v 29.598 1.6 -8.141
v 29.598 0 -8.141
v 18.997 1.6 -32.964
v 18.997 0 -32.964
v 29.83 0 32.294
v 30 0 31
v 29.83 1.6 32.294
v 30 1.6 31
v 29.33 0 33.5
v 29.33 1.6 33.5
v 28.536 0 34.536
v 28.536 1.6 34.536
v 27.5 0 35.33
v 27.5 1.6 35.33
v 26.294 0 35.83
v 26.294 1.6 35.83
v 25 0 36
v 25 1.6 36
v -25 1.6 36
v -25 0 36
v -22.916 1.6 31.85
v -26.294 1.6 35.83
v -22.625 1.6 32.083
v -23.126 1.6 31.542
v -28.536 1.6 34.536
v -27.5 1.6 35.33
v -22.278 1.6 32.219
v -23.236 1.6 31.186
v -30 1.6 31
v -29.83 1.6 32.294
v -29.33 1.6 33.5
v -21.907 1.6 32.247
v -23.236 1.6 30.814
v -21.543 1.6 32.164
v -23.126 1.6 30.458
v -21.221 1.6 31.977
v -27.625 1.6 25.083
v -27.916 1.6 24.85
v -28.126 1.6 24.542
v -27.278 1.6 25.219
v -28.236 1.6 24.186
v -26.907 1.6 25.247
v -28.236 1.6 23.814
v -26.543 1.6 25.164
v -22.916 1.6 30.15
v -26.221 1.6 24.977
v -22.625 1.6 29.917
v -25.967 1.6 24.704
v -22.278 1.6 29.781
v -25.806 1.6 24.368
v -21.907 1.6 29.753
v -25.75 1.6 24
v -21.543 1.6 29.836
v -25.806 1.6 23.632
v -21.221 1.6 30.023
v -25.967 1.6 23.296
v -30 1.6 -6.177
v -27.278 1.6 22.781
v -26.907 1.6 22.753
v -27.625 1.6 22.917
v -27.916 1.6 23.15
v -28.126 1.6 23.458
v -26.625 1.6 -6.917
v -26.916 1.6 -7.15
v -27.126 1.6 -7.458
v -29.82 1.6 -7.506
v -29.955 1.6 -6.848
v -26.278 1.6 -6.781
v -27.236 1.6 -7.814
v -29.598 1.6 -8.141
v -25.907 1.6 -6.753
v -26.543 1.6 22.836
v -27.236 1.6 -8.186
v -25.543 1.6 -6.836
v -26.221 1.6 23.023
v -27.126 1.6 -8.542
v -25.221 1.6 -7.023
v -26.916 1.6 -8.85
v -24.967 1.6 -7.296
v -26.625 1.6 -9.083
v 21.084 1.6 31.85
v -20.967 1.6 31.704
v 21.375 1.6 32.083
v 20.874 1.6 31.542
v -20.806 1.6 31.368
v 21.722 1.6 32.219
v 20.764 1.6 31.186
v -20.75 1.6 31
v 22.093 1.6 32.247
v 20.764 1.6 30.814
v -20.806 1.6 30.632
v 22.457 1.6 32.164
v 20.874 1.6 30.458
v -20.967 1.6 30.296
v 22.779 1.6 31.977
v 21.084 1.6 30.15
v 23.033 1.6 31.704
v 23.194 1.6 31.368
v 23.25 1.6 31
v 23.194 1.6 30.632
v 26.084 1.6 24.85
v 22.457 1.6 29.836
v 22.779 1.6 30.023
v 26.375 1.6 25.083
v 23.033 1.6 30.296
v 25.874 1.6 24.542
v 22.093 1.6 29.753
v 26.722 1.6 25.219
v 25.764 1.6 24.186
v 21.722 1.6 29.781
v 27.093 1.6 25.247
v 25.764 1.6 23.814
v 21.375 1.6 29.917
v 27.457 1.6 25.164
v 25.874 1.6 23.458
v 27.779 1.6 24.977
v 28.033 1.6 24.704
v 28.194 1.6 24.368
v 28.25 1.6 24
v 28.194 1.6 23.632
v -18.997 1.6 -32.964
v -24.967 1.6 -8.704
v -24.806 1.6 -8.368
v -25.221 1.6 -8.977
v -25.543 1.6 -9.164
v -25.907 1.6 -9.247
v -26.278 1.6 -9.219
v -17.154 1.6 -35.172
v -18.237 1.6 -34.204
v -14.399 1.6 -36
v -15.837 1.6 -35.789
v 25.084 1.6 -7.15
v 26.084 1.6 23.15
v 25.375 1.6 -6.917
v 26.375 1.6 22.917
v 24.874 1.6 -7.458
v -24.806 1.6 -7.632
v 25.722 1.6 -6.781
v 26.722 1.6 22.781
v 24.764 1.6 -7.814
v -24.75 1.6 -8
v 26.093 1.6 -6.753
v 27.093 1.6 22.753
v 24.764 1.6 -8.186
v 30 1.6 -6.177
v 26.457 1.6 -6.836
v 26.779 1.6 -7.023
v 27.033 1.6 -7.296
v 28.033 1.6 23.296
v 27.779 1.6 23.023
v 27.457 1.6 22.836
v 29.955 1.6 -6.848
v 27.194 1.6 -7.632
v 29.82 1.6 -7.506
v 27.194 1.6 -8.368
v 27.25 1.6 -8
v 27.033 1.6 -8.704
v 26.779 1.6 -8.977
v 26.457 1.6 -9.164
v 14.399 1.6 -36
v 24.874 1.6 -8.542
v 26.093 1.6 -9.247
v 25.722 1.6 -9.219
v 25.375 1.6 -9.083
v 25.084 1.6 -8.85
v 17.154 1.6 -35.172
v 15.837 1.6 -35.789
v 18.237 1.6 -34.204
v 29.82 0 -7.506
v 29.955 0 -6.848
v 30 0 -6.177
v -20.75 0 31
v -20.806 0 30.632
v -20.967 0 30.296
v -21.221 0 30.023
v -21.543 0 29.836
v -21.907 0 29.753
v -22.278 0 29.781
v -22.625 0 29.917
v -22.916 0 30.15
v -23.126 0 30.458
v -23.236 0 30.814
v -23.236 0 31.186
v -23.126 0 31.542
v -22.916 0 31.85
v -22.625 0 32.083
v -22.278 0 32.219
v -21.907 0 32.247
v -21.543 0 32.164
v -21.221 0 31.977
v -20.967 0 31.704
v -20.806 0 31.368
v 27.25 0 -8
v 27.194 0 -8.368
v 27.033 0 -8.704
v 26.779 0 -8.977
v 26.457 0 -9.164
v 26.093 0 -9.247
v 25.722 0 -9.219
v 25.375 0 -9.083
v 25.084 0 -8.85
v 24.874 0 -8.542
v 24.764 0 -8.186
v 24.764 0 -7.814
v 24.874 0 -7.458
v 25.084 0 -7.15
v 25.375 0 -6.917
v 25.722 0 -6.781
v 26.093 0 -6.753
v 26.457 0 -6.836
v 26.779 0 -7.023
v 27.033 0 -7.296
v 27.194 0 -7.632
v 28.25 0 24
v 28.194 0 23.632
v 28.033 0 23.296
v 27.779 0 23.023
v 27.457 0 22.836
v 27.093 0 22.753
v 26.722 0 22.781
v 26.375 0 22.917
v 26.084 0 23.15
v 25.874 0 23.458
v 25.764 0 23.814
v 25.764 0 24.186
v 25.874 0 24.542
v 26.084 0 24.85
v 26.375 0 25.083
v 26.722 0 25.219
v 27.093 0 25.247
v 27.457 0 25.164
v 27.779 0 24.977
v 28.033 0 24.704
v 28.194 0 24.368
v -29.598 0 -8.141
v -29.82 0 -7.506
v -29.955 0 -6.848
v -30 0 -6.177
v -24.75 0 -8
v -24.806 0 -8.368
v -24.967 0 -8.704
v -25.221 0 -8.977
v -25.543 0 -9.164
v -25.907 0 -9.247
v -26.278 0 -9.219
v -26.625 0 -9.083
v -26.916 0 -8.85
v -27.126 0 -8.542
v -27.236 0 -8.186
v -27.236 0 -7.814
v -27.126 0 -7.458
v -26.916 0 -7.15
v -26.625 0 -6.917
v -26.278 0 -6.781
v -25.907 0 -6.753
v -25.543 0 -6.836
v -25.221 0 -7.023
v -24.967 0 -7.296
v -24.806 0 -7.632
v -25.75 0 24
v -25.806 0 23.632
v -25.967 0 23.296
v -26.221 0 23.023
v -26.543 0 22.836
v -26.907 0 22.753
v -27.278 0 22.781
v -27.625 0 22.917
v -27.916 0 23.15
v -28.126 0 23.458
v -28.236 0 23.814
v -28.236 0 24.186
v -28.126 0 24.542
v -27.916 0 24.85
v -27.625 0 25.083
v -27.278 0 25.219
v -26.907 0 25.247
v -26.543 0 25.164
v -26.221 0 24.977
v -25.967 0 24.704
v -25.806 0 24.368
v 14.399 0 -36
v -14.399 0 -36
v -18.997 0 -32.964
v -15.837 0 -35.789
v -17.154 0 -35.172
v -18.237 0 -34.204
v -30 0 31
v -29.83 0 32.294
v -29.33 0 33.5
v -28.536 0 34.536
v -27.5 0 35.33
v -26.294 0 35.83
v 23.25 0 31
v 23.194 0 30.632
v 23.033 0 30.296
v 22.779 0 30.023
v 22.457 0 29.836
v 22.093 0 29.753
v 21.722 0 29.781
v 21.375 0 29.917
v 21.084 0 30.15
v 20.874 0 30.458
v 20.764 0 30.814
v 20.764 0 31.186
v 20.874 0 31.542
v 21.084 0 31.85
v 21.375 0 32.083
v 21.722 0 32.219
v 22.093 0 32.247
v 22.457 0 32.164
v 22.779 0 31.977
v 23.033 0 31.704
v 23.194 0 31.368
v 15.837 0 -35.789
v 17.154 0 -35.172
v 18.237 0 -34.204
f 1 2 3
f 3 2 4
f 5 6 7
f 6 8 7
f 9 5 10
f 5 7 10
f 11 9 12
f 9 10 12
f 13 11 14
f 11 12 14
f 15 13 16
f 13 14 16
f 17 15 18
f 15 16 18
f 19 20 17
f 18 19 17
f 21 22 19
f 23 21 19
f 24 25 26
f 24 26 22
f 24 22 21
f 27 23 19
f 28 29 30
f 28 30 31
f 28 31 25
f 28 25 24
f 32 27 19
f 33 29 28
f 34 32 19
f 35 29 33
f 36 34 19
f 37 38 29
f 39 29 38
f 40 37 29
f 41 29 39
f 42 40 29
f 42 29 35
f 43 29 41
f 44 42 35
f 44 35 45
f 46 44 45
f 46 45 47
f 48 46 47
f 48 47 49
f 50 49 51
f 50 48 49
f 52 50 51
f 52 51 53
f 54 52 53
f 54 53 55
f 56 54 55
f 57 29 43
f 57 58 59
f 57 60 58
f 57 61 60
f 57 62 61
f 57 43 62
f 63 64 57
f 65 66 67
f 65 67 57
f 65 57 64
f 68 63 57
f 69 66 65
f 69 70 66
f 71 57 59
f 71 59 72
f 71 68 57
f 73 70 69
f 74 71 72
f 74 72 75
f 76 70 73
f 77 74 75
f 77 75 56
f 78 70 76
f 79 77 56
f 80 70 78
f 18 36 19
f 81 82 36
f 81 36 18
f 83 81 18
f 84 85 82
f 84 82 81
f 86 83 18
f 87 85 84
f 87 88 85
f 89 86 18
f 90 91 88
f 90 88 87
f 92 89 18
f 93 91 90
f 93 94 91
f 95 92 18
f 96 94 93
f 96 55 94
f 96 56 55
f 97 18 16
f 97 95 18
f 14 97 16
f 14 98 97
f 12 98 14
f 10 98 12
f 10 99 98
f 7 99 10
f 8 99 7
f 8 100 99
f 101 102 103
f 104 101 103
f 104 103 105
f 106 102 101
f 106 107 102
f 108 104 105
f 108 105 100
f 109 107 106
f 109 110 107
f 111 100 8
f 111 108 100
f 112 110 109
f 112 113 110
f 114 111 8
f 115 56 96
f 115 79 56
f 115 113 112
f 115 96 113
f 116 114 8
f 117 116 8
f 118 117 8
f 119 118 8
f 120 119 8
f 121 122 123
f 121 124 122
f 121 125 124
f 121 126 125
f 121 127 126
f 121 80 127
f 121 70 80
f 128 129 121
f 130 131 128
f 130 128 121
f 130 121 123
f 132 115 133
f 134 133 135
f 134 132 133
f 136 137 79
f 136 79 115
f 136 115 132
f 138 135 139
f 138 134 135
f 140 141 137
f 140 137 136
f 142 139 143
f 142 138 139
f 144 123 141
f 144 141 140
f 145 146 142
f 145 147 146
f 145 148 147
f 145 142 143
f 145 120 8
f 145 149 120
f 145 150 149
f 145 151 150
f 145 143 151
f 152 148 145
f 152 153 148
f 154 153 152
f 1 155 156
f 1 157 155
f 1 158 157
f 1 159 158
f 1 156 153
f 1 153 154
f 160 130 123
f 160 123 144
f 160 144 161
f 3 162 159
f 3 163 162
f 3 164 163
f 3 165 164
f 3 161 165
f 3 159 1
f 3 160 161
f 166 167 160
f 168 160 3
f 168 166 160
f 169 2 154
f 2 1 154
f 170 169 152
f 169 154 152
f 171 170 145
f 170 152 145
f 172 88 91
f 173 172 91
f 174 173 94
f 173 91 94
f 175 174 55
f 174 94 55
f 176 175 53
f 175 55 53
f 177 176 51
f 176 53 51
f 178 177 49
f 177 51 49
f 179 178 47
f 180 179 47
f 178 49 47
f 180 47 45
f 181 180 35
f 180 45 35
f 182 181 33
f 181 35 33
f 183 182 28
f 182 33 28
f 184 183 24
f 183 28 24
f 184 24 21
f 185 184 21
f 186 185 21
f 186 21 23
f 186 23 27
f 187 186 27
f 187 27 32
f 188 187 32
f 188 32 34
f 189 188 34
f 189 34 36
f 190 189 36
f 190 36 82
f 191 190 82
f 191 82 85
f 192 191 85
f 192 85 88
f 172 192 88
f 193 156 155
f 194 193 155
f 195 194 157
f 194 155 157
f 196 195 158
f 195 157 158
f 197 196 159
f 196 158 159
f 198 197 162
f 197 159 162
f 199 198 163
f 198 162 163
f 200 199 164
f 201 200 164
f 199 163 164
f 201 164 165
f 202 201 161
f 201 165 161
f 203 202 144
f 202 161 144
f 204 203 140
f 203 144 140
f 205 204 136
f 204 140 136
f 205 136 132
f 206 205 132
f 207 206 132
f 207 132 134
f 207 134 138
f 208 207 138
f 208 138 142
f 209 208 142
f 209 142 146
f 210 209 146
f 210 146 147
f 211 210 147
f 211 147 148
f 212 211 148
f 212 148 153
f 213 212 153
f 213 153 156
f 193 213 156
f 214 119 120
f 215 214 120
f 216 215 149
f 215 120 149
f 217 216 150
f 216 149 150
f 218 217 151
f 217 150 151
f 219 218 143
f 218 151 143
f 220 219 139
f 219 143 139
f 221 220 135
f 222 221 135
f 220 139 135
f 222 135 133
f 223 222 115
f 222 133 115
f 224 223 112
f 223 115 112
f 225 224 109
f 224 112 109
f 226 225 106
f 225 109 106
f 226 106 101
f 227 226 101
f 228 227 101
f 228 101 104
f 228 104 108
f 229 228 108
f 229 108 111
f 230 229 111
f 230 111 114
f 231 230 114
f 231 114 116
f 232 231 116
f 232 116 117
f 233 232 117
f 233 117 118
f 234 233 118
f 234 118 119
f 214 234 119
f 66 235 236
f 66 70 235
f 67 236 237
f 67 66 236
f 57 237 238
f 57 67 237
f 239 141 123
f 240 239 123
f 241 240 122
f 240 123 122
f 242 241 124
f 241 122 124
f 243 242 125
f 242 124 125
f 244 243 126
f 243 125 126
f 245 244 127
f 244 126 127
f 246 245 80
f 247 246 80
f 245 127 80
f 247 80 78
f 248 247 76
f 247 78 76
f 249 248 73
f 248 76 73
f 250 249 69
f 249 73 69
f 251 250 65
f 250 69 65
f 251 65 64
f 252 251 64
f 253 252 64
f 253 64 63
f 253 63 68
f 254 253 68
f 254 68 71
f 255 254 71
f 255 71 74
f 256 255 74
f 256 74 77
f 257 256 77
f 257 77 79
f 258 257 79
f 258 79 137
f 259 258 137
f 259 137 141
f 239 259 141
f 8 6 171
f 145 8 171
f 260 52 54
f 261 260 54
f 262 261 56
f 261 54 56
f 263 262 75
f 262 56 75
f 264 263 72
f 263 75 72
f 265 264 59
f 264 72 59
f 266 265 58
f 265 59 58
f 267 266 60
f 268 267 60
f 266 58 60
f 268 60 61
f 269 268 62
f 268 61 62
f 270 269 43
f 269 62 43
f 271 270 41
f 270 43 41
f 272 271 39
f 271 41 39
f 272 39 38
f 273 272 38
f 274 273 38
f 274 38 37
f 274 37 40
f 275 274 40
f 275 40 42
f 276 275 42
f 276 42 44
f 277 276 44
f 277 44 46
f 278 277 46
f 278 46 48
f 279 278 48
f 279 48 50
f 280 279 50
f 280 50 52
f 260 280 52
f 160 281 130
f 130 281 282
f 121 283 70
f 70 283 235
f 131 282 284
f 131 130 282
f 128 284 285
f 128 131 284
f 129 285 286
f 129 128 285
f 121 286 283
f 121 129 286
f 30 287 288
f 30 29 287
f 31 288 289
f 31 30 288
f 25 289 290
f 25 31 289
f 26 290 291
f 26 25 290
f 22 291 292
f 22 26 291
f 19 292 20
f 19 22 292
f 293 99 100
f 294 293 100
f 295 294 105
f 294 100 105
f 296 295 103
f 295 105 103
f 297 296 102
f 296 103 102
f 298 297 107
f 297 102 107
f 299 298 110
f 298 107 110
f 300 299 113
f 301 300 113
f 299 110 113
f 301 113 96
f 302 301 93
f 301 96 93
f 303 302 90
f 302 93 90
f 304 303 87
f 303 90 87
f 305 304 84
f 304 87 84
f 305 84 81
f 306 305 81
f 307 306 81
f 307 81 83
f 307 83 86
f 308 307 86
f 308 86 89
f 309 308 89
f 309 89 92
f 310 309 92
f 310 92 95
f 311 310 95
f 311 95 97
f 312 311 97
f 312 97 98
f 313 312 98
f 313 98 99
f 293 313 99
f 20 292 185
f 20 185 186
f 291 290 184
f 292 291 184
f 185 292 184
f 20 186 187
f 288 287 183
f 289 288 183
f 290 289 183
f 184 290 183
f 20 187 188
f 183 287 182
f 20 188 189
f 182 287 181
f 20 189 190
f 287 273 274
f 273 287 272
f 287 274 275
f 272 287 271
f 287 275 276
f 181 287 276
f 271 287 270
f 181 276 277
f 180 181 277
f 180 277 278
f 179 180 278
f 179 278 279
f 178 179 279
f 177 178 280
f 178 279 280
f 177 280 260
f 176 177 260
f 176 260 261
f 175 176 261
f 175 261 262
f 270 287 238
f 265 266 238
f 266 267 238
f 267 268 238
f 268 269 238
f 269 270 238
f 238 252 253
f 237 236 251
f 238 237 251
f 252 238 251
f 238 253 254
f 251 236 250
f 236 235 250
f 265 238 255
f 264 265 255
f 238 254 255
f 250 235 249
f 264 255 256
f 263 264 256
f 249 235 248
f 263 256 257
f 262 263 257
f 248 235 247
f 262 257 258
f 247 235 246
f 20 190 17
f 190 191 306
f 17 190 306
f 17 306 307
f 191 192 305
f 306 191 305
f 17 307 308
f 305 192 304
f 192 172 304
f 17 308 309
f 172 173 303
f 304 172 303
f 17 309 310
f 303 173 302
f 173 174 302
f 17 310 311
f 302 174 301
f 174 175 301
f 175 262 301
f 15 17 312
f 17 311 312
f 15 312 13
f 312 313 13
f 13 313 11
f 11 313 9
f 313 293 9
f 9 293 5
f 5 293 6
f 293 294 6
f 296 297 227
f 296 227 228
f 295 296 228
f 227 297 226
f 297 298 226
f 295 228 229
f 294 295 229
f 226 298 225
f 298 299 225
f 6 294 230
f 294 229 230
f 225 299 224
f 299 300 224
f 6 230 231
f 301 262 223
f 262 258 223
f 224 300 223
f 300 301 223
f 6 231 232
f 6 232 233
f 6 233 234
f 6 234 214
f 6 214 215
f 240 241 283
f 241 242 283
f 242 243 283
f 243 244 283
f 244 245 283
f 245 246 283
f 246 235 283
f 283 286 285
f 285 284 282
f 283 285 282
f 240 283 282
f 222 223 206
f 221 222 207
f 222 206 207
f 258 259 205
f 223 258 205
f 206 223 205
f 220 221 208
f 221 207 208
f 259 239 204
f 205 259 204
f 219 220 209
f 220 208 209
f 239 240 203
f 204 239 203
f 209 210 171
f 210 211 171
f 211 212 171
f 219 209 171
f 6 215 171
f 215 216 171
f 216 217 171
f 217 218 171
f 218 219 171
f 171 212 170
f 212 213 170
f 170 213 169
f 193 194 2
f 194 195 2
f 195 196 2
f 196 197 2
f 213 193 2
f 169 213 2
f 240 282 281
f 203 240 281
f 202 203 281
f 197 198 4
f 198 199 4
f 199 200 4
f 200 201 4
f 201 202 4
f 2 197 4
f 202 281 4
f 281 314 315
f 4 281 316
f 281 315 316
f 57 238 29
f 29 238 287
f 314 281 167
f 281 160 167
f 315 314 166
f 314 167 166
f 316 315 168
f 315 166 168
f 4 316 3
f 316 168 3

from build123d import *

# Parameters (mm, degrees)
BOSS_EXTRUDE1_DEPTH = 1.6
CUT_EXTRUDE1_START  = 1.6
SKETCH2_R           = 1.25
CUT_EXTRUDE1_DEPTH  = 2.5
FILLET1_R           = 5


with BuildPart() as part:
    # Sketch1 → Boss-Extrude1 (new body)
    with BuildSketch(Plane(origin=(0, 0, 0), x_dir=(1, 0, 0), z_dir=(0, 1, 0))):
        Polygon((17.7, 36), (-17.7, 36), (-30, 7.2), (-30, -36), (30, -36), (30, 7.2), align=None)
    extrude(amount=BOSS_EXTRUDE1_DEPTH)

    # Sketch2 → Cut-Extrude1 (cut)
    with BuildSketch(Plane(origin=(0, 0, 0), x_dir=(1, 0, 0), z_dir=(0, 1, 0)).offset(CUT_EXTRUDE1_START)):
        with Locations((-27, -24)):
            Circle(SKETCH2_R)
        with Locations((27, -24)):
            Circle(SKETCH2_R)
        with Locations((26, 8)):
            Circle(SKETCH2_R)
        with Locations((-26, 8)):
            Circle(SKETCH2_R)
        with Locations((-22, -31)):
            Circle(SKETCH2_R)
        with Locations((22, -31)):
            Circle(SKETCH2_R)
    extrude(amount=-CUT_EXTRUDE1_DEPTH, mode=Mode.SUBTRACT)

    # Fillet1
    fillet1_edges = [part.edges().sort_by_distance(p)[0] for p in [
        (30, 0.8, -7.2),
        (30, 0.8, 36),
        (-30, 0.8, 36),
        (-30, 0.8, -7.2),
        (-17.7, 0.8, -36),
        (17.7, 0.8, -36),
    ]]
    fillet(fillet1_edges, radius=FILLET1_R)


solid = part.part
